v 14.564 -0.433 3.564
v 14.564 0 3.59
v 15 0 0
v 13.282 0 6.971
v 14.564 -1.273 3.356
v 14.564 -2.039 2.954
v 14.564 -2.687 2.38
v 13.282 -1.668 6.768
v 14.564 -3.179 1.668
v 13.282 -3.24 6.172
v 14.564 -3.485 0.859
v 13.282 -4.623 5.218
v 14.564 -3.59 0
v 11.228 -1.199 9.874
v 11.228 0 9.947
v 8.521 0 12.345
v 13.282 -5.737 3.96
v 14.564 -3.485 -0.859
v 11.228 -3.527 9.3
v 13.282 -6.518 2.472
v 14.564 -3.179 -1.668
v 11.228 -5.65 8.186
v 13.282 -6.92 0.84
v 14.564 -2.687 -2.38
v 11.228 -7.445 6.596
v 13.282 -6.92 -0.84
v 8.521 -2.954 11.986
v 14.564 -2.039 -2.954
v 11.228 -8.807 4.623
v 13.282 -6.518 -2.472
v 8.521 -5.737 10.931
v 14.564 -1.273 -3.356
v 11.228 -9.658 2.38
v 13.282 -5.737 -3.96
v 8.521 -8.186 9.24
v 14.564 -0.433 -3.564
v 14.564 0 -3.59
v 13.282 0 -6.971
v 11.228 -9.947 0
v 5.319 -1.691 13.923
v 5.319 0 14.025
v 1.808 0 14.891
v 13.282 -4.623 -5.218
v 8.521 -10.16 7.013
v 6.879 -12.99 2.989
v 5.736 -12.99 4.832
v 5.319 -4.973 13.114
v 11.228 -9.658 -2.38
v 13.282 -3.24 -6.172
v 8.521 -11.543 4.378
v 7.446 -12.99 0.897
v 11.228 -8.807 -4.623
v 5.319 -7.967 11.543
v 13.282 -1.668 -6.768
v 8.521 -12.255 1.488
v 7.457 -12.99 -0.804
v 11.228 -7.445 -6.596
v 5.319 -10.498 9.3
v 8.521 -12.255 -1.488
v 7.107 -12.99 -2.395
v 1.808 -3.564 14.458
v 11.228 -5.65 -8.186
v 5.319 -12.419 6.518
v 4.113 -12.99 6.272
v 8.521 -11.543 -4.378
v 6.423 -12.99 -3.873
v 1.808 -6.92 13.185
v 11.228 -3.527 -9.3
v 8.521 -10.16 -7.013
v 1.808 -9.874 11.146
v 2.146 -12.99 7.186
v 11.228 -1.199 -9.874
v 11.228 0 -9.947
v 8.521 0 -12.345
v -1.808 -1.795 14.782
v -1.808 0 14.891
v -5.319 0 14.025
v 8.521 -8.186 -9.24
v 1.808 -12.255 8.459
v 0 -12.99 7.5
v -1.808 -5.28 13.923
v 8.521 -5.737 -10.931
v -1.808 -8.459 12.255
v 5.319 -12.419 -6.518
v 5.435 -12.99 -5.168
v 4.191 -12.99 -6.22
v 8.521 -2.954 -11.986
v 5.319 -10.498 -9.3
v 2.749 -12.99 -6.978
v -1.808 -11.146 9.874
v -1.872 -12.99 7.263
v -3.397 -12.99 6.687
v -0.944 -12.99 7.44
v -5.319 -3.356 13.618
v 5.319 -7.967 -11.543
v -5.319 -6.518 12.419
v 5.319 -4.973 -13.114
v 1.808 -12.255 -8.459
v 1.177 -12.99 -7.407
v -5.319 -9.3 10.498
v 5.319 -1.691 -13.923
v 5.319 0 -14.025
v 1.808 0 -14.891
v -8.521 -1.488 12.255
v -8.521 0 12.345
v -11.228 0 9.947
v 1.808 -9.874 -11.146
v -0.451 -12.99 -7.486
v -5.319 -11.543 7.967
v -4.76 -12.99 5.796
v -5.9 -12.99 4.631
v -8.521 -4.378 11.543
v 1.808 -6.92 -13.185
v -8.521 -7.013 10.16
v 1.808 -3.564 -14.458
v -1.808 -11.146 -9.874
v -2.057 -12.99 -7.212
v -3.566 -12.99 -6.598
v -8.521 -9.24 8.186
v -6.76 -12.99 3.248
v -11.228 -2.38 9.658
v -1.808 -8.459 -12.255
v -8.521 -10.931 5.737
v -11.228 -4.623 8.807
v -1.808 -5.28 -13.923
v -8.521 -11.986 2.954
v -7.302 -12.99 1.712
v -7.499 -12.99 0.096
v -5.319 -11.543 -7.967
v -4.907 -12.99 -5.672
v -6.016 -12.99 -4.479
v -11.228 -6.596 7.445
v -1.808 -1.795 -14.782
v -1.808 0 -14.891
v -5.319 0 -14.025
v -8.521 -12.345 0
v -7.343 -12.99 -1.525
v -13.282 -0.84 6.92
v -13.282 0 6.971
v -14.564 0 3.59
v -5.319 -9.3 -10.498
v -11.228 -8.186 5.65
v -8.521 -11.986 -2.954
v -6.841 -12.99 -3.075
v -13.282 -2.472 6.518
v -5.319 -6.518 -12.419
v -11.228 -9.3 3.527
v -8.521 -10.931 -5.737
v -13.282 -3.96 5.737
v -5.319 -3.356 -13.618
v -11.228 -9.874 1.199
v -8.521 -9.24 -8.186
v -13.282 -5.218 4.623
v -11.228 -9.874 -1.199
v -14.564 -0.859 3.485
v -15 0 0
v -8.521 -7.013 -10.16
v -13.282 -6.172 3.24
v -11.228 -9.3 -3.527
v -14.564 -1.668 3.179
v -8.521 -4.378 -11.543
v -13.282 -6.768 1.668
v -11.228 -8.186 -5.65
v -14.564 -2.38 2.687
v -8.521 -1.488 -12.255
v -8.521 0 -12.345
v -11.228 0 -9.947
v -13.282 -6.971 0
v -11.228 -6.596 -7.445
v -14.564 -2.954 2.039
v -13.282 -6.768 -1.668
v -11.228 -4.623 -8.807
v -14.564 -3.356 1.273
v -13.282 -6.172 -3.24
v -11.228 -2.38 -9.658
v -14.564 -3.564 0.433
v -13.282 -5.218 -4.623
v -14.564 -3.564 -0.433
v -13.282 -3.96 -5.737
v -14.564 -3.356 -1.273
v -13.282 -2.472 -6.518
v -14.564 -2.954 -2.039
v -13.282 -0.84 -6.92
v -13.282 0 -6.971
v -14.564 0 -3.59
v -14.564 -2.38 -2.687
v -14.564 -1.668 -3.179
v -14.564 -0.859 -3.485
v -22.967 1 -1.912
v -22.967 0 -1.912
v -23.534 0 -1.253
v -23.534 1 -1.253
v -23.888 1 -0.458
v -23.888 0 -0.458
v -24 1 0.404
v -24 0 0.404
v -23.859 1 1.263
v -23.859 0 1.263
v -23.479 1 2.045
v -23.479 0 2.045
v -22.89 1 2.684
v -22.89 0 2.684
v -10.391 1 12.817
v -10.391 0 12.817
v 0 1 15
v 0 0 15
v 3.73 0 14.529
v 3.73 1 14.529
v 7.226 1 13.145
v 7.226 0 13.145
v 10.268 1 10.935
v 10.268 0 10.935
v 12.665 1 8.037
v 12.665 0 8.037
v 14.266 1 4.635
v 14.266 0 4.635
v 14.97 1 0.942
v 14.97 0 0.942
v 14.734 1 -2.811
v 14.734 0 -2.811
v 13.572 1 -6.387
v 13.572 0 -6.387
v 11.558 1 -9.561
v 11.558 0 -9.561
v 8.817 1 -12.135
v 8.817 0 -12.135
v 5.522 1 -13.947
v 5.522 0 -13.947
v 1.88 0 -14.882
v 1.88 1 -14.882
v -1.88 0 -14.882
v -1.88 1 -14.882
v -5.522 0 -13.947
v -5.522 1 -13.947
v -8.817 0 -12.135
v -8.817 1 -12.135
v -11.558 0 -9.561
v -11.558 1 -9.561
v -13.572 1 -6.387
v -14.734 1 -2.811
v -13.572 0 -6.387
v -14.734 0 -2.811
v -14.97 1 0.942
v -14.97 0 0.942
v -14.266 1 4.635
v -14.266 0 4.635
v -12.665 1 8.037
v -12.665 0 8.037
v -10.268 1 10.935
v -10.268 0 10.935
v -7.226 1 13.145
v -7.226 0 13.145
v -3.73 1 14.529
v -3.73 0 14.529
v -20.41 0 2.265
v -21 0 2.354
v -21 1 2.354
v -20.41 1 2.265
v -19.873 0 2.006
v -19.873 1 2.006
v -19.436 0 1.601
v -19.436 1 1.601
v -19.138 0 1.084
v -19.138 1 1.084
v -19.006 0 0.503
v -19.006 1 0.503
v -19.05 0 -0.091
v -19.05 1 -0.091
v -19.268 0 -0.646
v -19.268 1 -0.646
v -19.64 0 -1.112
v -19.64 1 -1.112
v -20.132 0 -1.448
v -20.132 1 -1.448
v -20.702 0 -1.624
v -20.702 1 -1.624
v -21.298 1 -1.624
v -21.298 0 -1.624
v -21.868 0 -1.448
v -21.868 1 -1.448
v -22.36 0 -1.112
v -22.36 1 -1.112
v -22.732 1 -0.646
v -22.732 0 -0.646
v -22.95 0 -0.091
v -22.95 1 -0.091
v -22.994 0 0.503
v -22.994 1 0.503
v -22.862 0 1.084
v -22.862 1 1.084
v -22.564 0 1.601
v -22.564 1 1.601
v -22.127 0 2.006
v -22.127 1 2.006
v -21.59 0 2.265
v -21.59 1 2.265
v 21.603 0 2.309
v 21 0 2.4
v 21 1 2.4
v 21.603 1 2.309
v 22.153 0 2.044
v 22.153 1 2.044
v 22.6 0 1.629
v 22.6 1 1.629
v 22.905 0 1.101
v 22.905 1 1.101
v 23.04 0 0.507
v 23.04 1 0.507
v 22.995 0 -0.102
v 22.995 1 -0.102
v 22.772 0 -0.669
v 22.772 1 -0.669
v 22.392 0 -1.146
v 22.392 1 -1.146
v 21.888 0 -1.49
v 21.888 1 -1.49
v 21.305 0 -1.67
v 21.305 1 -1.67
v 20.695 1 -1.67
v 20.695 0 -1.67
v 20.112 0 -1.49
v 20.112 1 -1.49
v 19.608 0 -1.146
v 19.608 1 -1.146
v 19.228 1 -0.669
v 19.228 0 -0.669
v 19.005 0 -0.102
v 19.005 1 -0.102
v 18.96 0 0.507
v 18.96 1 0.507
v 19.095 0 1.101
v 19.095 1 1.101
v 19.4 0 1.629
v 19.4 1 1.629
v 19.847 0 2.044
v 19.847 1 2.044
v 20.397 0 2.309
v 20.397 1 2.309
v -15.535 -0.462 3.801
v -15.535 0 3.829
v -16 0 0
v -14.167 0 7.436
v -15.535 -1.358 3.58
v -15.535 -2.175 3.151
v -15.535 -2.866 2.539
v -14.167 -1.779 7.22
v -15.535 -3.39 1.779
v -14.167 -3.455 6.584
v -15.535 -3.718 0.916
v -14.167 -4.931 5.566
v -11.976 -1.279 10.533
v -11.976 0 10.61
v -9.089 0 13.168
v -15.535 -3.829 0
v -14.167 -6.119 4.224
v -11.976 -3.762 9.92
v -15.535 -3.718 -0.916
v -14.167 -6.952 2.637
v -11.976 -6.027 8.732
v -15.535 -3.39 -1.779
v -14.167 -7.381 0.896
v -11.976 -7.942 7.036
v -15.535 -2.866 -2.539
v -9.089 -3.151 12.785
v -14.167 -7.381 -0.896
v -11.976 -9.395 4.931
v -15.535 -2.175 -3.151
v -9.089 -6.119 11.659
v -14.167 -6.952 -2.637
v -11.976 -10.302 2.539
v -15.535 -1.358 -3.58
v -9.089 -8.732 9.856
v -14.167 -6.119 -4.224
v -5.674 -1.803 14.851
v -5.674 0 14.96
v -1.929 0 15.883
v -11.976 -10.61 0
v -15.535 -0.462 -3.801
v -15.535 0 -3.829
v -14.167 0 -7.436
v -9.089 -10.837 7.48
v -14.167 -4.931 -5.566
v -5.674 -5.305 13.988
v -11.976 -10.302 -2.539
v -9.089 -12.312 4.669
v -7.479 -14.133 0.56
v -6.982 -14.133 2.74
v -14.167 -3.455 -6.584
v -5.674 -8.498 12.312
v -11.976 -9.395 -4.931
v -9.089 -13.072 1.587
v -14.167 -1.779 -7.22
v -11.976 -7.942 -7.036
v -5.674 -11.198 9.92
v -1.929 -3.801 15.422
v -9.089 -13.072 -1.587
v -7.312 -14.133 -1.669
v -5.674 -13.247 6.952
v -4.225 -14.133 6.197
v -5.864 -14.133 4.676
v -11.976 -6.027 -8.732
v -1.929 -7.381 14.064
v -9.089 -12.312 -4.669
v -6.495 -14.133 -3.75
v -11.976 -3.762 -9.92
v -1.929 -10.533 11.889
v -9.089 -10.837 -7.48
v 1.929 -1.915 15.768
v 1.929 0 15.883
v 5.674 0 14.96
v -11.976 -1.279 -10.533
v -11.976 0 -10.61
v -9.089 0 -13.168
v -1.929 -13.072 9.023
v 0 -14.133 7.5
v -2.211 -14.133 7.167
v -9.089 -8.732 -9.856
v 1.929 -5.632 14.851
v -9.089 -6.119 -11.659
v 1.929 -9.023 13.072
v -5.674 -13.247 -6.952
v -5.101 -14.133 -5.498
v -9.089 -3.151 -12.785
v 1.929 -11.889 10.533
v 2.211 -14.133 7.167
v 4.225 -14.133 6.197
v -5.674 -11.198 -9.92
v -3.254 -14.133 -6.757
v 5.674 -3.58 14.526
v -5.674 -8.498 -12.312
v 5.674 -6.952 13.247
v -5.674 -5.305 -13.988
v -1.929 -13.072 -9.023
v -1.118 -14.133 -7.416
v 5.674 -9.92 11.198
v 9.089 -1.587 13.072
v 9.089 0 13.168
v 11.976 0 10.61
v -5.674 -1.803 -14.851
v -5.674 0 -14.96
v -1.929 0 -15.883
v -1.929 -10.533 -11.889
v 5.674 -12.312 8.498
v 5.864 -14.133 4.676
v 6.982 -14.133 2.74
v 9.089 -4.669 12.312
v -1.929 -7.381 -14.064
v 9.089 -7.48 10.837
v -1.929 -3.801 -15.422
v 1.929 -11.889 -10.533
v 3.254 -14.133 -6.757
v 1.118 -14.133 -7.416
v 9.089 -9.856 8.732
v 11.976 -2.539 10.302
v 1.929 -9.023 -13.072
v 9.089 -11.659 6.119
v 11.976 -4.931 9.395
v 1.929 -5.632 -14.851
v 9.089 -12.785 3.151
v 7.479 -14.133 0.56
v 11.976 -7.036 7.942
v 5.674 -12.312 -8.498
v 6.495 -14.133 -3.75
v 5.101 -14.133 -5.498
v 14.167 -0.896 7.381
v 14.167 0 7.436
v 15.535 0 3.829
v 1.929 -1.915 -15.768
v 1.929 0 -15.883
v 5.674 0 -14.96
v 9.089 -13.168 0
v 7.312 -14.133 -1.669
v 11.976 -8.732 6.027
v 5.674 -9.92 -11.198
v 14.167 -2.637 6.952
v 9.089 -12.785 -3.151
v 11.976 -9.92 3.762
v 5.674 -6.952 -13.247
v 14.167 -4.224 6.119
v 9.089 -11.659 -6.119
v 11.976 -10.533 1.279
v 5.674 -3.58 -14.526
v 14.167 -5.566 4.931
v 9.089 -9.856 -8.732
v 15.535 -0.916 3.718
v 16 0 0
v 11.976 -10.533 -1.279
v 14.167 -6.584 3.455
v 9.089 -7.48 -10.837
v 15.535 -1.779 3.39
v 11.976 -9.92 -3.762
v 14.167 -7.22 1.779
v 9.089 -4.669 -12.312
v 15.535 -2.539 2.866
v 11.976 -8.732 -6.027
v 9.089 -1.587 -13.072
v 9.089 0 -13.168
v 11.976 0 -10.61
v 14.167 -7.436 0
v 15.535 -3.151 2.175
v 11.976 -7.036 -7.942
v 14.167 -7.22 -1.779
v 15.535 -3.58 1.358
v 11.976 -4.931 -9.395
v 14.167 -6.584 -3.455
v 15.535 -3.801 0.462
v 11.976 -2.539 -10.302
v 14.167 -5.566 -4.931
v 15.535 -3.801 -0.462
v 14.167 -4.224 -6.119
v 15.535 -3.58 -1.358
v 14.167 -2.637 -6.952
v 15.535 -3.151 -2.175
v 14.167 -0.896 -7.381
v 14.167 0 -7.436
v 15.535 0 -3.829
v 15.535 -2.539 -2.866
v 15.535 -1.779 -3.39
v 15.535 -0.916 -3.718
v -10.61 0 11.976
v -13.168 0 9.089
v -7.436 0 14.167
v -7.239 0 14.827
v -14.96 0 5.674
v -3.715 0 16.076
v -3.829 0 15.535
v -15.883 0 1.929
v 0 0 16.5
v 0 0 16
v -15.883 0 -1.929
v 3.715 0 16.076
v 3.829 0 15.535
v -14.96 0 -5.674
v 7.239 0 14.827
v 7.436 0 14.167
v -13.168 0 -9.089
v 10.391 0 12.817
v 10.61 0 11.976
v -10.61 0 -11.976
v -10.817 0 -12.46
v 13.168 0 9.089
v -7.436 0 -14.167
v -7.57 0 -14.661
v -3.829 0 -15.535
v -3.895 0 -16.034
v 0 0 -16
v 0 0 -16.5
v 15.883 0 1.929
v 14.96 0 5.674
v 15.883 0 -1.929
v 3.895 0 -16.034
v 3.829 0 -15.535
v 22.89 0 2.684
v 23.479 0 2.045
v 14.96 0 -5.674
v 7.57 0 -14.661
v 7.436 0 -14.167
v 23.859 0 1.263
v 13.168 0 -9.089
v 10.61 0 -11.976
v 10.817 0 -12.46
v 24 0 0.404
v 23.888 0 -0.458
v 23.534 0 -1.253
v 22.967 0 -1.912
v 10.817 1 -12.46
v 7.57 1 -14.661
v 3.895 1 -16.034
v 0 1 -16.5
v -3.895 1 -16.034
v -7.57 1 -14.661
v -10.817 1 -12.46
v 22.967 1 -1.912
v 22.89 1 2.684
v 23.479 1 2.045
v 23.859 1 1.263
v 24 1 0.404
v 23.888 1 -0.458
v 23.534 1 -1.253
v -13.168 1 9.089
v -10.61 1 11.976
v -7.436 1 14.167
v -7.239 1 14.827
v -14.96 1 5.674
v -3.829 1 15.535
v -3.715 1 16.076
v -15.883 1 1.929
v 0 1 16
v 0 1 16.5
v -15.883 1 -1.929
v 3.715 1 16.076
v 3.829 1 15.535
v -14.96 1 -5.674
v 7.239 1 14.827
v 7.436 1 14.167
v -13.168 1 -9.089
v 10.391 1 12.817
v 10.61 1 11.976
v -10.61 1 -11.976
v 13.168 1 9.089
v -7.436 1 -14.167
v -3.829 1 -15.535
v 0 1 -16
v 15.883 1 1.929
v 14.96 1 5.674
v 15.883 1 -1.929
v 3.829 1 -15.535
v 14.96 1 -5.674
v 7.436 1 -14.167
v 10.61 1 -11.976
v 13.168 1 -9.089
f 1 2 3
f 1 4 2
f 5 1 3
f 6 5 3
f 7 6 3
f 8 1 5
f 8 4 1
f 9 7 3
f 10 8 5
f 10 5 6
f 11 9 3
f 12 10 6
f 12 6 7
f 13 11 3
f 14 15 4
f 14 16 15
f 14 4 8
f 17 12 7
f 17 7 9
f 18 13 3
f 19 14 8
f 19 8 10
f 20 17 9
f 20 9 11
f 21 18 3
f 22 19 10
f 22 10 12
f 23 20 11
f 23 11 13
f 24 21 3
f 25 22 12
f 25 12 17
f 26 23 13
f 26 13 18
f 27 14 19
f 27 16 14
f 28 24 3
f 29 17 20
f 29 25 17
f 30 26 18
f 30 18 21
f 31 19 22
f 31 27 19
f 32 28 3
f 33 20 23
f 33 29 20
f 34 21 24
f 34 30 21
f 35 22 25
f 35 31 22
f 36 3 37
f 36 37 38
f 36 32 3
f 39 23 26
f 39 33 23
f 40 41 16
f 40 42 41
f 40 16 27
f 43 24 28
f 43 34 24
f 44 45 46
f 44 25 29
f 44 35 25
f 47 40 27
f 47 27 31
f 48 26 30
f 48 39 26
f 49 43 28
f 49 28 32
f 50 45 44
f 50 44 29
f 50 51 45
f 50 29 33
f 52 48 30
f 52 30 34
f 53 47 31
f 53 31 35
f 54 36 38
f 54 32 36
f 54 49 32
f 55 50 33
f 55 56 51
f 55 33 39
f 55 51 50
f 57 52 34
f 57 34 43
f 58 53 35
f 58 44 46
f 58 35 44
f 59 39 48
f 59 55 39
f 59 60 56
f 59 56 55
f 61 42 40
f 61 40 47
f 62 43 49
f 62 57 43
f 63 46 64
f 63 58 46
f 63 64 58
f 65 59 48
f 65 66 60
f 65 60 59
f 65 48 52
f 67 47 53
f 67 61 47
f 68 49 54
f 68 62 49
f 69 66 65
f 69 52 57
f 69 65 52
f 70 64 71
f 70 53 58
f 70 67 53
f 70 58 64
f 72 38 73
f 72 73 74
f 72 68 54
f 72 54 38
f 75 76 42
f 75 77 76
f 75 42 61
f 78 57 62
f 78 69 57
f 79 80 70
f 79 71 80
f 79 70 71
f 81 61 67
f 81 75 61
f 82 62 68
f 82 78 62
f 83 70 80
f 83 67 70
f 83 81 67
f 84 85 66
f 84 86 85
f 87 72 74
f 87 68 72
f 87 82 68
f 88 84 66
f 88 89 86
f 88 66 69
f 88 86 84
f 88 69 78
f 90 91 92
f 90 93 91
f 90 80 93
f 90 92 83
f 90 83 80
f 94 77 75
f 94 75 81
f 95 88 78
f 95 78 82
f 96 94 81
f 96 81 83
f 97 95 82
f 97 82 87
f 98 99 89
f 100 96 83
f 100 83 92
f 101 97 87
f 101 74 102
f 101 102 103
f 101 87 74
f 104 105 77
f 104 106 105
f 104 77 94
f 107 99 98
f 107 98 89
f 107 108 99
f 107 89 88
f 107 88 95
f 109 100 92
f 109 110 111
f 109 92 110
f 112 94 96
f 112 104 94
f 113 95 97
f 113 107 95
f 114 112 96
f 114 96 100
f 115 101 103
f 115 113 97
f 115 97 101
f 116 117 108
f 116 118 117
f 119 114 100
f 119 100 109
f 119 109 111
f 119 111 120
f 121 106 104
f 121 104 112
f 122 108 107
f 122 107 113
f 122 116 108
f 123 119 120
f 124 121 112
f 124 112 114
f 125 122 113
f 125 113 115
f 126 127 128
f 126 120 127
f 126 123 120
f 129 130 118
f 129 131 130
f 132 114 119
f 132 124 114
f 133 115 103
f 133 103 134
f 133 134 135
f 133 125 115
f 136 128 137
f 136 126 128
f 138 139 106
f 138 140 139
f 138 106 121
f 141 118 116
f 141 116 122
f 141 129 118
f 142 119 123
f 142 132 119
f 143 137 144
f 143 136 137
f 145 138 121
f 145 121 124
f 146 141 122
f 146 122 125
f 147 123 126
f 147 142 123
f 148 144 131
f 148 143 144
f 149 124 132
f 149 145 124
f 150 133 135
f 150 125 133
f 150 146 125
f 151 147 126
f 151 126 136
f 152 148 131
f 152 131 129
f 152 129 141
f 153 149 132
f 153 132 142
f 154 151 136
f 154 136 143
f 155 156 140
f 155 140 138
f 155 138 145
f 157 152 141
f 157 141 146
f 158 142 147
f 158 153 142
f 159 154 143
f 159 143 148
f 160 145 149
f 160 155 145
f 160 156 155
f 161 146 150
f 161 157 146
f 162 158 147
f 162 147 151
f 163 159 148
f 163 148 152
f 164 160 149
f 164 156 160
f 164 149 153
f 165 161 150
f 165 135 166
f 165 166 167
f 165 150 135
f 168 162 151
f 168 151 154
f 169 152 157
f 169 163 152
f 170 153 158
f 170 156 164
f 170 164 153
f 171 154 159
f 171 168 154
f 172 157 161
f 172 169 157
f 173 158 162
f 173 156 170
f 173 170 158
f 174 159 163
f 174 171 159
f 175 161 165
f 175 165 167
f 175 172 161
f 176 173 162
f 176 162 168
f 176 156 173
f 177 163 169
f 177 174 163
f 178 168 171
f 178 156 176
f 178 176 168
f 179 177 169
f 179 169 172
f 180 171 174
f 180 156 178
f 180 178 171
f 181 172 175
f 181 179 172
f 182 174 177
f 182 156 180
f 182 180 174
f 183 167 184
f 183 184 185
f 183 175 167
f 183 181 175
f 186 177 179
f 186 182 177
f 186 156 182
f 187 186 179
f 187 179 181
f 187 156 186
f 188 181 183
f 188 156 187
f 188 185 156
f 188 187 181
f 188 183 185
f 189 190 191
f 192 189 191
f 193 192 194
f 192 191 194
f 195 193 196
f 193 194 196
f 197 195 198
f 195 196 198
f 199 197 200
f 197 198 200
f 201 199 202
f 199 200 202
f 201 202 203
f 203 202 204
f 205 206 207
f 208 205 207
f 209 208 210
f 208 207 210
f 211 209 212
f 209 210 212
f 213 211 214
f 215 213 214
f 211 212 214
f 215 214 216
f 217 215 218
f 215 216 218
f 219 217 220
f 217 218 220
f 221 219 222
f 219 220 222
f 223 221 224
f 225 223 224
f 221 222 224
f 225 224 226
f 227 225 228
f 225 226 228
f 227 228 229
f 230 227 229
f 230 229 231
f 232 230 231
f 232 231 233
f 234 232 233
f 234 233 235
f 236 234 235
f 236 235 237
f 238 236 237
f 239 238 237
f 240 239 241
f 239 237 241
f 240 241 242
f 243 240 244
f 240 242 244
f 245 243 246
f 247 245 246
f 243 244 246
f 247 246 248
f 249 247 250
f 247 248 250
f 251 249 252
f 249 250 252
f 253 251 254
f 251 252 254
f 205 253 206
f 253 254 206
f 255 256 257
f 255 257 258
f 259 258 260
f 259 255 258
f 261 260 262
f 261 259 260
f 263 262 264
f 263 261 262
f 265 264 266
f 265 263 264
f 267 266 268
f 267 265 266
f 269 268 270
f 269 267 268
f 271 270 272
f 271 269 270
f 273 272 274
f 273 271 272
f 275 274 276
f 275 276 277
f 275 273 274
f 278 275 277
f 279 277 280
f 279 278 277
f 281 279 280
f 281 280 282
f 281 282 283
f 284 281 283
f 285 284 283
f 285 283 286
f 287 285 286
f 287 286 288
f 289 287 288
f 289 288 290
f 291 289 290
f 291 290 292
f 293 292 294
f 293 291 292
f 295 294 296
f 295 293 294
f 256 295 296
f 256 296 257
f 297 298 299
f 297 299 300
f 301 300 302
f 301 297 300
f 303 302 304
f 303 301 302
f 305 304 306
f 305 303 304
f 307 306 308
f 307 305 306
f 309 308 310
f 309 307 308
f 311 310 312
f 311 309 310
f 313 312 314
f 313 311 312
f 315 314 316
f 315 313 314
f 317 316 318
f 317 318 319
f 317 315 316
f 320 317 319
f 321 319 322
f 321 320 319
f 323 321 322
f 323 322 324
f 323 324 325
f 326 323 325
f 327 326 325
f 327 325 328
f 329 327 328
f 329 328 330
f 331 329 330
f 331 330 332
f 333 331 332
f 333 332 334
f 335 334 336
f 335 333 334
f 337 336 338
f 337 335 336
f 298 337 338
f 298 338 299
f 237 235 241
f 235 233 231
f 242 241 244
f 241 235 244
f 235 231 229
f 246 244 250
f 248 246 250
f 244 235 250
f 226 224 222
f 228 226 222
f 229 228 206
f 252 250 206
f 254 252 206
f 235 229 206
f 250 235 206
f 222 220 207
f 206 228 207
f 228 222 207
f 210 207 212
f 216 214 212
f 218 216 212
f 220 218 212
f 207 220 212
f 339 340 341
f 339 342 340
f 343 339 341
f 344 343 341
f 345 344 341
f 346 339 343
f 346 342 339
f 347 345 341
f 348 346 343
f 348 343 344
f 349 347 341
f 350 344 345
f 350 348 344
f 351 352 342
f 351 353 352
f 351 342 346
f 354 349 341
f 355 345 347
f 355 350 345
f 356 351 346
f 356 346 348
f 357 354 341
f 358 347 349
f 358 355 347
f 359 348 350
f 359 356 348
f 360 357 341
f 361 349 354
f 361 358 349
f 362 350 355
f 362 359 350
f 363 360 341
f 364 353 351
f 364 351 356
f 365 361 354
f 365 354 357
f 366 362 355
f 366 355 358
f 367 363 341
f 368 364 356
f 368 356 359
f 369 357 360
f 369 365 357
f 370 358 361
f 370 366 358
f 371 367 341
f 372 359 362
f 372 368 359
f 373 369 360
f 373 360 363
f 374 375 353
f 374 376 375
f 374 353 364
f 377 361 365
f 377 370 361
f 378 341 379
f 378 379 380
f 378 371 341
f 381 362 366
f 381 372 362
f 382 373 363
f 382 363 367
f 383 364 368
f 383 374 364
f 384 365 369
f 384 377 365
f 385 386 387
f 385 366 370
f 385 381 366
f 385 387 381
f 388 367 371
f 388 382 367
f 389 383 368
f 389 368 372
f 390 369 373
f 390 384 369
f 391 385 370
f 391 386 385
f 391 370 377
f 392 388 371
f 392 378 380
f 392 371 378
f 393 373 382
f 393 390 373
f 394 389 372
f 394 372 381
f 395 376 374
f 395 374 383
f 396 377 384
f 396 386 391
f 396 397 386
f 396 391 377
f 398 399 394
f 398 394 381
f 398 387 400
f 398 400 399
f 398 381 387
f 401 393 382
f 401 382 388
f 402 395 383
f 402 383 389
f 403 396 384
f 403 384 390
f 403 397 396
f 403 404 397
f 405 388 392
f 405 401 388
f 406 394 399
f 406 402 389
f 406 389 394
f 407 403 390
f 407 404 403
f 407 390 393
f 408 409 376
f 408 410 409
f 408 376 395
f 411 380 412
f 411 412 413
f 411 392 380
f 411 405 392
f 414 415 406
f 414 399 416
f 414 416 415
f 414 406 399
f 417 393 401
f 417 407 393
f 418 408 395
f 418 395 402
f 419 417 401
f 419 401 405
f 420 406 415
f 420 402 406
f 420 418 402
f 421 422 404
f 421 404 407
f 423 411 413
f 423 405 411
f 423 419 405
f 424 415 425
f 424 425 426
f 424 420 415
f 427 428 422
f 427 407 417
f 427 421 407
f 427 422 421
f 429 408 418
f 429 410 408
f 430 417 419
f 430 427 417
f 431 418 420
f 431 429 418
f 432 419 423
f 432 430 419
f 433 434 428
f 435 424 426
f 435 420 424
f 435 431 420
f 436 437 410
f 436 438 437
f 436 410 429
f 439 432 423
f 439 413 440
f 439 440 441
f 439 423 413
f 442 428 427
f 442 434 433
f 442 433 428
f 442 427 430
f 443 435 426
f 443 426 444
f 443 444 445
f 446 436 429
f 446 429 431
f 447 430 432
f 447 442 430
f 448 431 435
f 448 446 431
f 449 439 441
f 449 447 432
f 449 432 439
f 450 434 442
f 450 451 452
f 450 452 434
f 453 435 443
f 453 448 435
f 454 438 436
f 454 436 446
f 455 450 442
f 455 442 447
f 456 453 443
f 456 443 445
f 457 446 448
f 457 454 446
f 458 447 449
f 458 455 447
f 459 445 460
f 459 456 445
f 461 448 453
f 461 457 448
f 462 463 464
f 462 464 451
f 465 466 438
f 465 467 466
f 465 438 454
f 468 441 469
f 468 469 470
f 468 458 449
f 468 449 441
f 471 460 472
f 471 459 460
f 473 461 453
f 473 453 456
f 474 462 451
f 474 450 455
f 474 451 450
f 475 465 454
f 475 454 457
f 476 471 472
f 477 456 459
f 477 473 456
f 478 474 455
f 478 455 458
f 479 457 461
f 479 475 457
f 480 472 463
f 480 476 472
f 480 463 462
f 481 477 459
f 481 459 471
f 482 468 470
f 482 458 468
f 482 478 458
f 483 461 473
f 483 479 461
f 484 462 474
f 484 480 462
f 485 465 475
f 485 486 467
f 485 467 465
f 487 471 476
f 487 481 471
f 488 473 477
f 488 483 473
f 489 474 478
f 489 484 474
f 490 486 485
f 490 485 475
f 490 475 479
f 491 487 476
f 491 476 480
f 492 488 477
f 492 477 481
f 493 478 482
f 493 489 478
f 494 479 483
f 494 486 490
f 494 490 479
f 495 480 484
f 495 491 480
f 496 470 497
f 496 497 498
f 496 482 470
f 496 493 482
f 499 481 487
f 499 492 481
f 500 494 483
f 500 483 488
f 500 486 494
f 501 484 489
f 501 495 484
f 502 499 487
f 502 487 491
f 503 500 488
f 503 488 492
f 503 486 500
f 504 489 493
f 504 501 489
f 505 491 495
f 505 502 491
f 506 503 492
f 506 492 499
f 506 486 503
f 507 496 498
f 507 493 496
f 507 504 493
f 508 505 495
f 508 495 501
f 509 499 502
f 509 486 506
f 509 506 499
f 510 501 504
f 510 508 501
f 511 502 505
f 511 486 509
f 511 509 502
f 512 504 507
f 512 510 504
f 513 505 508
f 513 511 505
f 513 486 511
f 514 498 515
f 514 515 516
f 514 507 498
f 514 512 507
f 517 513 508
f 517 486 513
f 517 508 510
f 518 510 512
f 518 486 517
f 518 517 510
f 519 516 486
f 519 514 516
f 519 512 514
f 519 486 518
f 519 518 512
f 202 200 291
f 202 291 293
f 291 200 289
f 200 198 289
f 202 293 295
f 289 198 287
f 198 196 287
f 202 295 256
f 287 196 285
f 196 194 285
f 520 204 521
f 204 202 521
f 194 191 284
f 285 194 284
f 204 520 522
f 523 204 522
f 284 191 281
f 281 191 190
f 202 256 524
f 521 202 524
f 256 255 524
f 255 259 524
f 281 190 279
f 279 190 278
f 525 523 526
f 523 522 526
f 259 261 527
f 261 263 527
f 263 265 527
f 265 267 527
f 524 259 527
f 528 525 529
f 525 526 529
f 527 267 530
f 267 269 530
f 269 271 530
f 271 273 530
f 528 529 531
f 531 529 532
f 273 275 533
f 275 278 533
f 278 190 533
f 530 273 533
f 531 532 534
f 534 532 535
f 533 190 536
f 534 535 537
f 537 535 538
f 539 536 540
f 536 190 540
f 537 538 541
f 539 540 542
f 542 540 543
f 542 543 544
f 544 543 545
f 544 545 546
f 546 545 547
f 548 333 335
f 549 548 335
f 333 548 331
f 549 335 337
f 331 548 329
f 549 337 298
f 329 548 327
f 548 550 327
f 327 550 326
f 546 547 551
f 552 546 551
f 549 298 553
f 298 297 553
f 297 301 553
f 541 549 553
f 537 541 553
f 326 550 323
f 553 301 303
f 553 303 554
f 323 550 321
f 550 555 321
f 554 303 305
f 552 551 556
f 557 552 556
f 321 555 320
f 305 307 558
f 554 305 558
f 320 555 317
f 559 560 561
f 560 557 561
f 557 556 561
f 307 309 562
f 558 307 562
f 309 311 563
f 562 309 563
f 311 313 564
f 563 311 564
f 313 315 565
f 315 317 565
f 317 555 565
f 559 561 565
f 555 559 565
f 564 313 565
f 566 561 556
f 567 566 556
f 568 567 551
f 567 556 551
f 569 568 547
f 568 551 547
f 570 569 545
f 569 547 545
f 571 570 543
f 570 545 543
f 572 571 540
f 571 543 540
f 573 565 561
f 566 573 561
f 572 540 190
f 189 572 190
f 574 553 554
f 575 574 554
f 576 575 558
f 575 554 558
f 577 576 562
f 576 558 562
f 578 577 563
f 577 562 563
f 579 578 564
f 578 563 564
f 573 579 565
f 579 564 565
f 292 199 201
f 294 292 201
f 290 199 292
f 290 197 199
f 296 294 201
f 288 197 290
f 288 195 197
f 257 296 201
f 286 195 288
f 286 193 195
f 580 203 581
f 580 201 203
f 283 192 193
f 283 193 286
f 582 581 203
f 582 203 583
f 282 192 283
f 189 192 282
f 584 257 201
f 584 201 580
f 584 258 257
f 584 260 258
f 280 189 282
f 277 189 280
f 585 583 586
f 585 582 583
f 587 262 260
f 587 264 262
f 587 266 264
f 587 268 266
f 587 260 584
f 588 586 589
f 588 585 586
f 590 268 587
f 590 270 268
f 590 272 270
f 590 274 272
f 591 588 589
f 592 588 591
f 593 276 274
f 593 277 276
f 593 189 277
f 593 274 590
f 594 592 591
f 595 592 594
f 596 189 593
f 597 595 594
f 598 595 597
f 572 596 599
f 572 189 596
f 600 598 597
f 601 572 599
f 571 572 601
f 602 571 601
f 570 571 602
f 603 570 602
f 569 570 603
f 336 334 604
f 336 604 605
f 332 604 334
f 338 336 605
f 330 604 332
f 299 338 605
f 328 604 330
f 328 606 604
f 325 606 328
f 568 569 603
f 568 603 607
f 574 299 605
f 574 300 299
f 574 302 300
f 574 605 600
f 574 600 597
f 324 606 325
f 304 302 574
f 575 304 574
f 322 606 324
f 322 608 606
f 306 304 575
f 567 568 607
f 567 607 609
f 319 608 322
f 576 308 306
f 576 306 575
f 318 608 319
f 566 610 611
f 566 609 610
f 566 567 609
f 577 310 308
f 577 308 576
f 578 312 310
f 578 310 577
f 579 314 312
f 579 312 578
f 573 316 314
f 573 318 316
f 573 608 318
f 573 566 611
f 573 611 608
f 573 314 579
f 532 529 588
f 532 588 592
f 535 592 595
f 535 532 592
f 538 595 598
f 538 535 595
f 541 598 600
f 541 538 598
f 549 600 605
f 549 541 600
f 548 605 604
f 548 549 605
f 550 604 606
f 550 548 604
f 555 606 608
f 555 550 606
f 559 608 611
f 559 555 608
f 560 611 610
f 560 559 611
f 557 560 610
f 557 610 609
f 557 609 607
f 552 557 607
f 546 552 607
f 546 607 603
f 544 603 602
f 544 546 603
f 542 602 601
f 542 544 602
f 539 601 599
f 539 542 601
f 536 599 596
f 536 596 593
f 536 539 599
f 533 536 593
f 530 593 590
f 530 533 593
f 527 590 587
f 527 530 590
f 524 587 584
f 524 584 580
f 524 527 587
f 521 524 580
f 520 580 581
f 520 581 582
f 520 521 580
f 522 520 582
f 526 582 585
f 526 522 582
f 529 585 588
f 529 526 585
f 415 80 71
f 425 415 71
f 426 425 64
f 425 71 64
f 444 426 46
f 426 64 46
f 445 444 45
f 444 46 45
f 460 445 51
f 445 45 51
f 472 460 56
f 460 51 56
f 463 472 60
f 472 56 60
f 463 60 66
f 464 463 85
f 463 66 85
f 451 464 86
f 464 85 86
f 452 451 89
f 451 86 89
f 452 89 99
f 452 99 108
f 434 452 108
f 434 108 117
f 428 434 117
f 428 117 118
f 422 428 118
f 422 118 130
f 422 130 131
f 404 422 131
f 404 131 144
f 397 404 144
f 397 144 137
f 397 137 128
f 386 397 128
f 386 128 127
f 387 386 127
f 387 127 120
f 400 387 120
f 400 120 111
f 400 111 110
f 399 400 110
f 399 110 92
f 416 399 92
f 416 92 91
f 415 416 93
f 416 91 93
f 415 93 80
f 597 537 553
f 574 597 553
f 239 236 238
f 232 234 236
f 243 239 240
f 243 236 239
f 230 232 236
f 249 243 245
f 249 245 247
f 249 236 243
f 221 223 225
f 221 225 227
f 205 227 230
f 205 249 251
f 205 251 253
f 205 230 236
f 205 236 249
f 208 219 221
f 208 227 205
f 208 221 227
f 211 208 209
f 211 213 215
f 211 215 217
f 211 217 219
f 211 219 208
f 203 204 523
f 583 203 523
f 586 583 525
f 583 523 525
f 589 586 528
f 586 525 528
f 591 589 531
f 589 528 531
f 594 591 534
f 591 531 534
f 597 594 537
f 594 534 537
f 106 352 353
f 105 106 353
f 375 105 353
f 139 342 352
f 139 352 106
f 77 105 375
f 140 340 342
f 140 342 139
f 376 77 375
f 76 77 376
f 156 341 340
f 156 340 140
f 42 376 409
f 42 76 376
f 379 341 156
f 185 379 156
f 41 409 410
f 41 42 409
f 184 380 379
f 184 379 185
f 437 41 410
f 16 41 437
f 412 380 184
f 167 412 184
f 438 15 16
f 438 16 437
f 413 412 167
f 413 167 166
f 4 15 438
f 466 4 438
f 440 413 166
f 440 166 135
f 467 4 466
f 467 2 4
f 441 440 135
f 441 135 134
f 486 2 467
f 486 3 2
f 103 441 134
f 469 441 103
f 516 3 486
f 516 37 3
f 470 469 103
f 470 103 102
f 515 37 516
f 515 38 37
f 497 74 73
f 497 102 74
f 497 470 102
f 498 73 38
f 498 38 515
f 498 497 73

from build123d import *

# Parameters (mm, degrees)
REVOLVE6_ANGLE          = 180
SKETCH1_9_R             = 2
BOSS_EXTRUDE1_DEPTH     = 1
SKETCH1_9_R_2           = 15
BOSS_EXTRUDE1_2_DEPTH   = 1
CUT_EXTRUDE1_REACH      = 35.231
CUT_EXTRUDE1_END_RADIUS = 16
SKETCH2_R               = 7.5


with BuildPart() as part:
    # Sketch1 → Revolve6 (revolve)
    with BuildSketch(Plane(origin=(0, 0, 0), x_dir=(1, 0, 0), z_dir=(0, 1, 0))):
        with BuildLine():
            ThreePointArc((-16, 0), (0, -16), (16, 0))
            Line((16, 0), (15, 0))
            ThreePointArc((15, 0), (0, -15), (-15, 0))
            Line((-15, 0), (-16, 0))
        make_face()
    revolve(axis=Axis((-19.031531421, 0, 0), (1, 0, 0)), revolution_arc=REVOLVE6_ANGLE)

    # Cut-Extrude1: up to this sphere (the profile starts inside it)
    cut_extrude1_end = Location((0, 0, 0)) * Sphere(CUT_EXTRUDE1_END_RADIUS, mode=Mode.PRIVATE)
    # Sketch2 → Cut-Extrude1 (cut, up to the surface)
    with BuildSketch(Plane(origin=(0, 0, 0), x_dir=(1, 0, 0), z_dir=(0, 1, 0)), mode=Mode.PRIVATE) as cut_extrude1_sk1:
        Circle(SKETCH2_R)
    cut_extrude1_tool1 = extrude(cut_extrude1_sk1.sketch, amount=-CUT_EXTRUDE1_REACH, mode=Mode.PRIVATE) & cut_extrude1_end
    add(cut_extrude1_tool1.solids().sort_by_distance((0, 0, 0))[0], mode=Mode.SUBTRACT)


with BuildPart() as body_2:
    # Sketch1<9> → Boss-Extrude1 (new body)
    with BuildSketch(Plane(origin=(0, 0, 0), x_dir=(1, 0, 0), z_dir=(0, 1, 0))):
        with BuildLine():
            ThreePointArc((-22.96695029, 1.912018961), (-24, -0.404273426), (-22.889523883, -2.684458707))
            Line((-22.889523883, -2.684458707), (-10.390907276, -12.81713876))
            ThreePointArc((-10.390907276, -12.81713876), (0, -16.5), (10.390907276, -12.81713876))
            Line((10.390907276, -12.81713876), (22.889523883, -2.684458707))
            ThreePointArc((22.889523883, -2.684458707), (23.780005188, -1.48251064), (23.979500335, 0))
            ThreePointArc((23.979500335, 0), (23.651565118, 1.050453093), (22.96695029, 1.912018961))
            Line((22.96695029, 1.912018961), (10.816692113, 12.459902557))
            ThreePointArc((10.816692113, 12.459902557), (0, 16.5), (-10.816692113, 12.459902557))
            Line((-10.816692113, 12.459902557), (-22.96695029, 1.912018961))
        make_face()
        with Locations((-21, -0.353739248)):
            Circle(SKETCH1_9_R, mode=Mode.SUBTRACT)
        with BuildLine():
            ThreePointArc((18.984689587, 0), (21, 1.692380865), (23.015310413, 0))
            ThreePointArc((23.015310413, 0), (21, -2.39985936), (18.984689587, 0))
        make_face(mode=Mode.SUBTRACT)
        with BuildLine():
            ThreePointArc((-16, 0), (0, 16), (16, 0))
            ThreePointArc((16, 0), (0, -16), (-16, 0))
        make_face(mode=Mode.SUBTRACT)
    extrude(amount=BOSS_EXTRUDE1_DEPTH)


with BuildPart() as body_3:
    # Sketch1<9> → Boss-Extrude1 2 (new body)
    with BuildSketch(Plane(origin=(0, 0, 0), x_dir=(1, 0, 0), z_dir=(0, 1, 0))):
        Circle(SKETCH1_9_R_2)
    extrude(amount=BOSS_EXTRUDE1_2_DEPTH)


solid = Compound([part.part, body_2.part, body_3.part])
